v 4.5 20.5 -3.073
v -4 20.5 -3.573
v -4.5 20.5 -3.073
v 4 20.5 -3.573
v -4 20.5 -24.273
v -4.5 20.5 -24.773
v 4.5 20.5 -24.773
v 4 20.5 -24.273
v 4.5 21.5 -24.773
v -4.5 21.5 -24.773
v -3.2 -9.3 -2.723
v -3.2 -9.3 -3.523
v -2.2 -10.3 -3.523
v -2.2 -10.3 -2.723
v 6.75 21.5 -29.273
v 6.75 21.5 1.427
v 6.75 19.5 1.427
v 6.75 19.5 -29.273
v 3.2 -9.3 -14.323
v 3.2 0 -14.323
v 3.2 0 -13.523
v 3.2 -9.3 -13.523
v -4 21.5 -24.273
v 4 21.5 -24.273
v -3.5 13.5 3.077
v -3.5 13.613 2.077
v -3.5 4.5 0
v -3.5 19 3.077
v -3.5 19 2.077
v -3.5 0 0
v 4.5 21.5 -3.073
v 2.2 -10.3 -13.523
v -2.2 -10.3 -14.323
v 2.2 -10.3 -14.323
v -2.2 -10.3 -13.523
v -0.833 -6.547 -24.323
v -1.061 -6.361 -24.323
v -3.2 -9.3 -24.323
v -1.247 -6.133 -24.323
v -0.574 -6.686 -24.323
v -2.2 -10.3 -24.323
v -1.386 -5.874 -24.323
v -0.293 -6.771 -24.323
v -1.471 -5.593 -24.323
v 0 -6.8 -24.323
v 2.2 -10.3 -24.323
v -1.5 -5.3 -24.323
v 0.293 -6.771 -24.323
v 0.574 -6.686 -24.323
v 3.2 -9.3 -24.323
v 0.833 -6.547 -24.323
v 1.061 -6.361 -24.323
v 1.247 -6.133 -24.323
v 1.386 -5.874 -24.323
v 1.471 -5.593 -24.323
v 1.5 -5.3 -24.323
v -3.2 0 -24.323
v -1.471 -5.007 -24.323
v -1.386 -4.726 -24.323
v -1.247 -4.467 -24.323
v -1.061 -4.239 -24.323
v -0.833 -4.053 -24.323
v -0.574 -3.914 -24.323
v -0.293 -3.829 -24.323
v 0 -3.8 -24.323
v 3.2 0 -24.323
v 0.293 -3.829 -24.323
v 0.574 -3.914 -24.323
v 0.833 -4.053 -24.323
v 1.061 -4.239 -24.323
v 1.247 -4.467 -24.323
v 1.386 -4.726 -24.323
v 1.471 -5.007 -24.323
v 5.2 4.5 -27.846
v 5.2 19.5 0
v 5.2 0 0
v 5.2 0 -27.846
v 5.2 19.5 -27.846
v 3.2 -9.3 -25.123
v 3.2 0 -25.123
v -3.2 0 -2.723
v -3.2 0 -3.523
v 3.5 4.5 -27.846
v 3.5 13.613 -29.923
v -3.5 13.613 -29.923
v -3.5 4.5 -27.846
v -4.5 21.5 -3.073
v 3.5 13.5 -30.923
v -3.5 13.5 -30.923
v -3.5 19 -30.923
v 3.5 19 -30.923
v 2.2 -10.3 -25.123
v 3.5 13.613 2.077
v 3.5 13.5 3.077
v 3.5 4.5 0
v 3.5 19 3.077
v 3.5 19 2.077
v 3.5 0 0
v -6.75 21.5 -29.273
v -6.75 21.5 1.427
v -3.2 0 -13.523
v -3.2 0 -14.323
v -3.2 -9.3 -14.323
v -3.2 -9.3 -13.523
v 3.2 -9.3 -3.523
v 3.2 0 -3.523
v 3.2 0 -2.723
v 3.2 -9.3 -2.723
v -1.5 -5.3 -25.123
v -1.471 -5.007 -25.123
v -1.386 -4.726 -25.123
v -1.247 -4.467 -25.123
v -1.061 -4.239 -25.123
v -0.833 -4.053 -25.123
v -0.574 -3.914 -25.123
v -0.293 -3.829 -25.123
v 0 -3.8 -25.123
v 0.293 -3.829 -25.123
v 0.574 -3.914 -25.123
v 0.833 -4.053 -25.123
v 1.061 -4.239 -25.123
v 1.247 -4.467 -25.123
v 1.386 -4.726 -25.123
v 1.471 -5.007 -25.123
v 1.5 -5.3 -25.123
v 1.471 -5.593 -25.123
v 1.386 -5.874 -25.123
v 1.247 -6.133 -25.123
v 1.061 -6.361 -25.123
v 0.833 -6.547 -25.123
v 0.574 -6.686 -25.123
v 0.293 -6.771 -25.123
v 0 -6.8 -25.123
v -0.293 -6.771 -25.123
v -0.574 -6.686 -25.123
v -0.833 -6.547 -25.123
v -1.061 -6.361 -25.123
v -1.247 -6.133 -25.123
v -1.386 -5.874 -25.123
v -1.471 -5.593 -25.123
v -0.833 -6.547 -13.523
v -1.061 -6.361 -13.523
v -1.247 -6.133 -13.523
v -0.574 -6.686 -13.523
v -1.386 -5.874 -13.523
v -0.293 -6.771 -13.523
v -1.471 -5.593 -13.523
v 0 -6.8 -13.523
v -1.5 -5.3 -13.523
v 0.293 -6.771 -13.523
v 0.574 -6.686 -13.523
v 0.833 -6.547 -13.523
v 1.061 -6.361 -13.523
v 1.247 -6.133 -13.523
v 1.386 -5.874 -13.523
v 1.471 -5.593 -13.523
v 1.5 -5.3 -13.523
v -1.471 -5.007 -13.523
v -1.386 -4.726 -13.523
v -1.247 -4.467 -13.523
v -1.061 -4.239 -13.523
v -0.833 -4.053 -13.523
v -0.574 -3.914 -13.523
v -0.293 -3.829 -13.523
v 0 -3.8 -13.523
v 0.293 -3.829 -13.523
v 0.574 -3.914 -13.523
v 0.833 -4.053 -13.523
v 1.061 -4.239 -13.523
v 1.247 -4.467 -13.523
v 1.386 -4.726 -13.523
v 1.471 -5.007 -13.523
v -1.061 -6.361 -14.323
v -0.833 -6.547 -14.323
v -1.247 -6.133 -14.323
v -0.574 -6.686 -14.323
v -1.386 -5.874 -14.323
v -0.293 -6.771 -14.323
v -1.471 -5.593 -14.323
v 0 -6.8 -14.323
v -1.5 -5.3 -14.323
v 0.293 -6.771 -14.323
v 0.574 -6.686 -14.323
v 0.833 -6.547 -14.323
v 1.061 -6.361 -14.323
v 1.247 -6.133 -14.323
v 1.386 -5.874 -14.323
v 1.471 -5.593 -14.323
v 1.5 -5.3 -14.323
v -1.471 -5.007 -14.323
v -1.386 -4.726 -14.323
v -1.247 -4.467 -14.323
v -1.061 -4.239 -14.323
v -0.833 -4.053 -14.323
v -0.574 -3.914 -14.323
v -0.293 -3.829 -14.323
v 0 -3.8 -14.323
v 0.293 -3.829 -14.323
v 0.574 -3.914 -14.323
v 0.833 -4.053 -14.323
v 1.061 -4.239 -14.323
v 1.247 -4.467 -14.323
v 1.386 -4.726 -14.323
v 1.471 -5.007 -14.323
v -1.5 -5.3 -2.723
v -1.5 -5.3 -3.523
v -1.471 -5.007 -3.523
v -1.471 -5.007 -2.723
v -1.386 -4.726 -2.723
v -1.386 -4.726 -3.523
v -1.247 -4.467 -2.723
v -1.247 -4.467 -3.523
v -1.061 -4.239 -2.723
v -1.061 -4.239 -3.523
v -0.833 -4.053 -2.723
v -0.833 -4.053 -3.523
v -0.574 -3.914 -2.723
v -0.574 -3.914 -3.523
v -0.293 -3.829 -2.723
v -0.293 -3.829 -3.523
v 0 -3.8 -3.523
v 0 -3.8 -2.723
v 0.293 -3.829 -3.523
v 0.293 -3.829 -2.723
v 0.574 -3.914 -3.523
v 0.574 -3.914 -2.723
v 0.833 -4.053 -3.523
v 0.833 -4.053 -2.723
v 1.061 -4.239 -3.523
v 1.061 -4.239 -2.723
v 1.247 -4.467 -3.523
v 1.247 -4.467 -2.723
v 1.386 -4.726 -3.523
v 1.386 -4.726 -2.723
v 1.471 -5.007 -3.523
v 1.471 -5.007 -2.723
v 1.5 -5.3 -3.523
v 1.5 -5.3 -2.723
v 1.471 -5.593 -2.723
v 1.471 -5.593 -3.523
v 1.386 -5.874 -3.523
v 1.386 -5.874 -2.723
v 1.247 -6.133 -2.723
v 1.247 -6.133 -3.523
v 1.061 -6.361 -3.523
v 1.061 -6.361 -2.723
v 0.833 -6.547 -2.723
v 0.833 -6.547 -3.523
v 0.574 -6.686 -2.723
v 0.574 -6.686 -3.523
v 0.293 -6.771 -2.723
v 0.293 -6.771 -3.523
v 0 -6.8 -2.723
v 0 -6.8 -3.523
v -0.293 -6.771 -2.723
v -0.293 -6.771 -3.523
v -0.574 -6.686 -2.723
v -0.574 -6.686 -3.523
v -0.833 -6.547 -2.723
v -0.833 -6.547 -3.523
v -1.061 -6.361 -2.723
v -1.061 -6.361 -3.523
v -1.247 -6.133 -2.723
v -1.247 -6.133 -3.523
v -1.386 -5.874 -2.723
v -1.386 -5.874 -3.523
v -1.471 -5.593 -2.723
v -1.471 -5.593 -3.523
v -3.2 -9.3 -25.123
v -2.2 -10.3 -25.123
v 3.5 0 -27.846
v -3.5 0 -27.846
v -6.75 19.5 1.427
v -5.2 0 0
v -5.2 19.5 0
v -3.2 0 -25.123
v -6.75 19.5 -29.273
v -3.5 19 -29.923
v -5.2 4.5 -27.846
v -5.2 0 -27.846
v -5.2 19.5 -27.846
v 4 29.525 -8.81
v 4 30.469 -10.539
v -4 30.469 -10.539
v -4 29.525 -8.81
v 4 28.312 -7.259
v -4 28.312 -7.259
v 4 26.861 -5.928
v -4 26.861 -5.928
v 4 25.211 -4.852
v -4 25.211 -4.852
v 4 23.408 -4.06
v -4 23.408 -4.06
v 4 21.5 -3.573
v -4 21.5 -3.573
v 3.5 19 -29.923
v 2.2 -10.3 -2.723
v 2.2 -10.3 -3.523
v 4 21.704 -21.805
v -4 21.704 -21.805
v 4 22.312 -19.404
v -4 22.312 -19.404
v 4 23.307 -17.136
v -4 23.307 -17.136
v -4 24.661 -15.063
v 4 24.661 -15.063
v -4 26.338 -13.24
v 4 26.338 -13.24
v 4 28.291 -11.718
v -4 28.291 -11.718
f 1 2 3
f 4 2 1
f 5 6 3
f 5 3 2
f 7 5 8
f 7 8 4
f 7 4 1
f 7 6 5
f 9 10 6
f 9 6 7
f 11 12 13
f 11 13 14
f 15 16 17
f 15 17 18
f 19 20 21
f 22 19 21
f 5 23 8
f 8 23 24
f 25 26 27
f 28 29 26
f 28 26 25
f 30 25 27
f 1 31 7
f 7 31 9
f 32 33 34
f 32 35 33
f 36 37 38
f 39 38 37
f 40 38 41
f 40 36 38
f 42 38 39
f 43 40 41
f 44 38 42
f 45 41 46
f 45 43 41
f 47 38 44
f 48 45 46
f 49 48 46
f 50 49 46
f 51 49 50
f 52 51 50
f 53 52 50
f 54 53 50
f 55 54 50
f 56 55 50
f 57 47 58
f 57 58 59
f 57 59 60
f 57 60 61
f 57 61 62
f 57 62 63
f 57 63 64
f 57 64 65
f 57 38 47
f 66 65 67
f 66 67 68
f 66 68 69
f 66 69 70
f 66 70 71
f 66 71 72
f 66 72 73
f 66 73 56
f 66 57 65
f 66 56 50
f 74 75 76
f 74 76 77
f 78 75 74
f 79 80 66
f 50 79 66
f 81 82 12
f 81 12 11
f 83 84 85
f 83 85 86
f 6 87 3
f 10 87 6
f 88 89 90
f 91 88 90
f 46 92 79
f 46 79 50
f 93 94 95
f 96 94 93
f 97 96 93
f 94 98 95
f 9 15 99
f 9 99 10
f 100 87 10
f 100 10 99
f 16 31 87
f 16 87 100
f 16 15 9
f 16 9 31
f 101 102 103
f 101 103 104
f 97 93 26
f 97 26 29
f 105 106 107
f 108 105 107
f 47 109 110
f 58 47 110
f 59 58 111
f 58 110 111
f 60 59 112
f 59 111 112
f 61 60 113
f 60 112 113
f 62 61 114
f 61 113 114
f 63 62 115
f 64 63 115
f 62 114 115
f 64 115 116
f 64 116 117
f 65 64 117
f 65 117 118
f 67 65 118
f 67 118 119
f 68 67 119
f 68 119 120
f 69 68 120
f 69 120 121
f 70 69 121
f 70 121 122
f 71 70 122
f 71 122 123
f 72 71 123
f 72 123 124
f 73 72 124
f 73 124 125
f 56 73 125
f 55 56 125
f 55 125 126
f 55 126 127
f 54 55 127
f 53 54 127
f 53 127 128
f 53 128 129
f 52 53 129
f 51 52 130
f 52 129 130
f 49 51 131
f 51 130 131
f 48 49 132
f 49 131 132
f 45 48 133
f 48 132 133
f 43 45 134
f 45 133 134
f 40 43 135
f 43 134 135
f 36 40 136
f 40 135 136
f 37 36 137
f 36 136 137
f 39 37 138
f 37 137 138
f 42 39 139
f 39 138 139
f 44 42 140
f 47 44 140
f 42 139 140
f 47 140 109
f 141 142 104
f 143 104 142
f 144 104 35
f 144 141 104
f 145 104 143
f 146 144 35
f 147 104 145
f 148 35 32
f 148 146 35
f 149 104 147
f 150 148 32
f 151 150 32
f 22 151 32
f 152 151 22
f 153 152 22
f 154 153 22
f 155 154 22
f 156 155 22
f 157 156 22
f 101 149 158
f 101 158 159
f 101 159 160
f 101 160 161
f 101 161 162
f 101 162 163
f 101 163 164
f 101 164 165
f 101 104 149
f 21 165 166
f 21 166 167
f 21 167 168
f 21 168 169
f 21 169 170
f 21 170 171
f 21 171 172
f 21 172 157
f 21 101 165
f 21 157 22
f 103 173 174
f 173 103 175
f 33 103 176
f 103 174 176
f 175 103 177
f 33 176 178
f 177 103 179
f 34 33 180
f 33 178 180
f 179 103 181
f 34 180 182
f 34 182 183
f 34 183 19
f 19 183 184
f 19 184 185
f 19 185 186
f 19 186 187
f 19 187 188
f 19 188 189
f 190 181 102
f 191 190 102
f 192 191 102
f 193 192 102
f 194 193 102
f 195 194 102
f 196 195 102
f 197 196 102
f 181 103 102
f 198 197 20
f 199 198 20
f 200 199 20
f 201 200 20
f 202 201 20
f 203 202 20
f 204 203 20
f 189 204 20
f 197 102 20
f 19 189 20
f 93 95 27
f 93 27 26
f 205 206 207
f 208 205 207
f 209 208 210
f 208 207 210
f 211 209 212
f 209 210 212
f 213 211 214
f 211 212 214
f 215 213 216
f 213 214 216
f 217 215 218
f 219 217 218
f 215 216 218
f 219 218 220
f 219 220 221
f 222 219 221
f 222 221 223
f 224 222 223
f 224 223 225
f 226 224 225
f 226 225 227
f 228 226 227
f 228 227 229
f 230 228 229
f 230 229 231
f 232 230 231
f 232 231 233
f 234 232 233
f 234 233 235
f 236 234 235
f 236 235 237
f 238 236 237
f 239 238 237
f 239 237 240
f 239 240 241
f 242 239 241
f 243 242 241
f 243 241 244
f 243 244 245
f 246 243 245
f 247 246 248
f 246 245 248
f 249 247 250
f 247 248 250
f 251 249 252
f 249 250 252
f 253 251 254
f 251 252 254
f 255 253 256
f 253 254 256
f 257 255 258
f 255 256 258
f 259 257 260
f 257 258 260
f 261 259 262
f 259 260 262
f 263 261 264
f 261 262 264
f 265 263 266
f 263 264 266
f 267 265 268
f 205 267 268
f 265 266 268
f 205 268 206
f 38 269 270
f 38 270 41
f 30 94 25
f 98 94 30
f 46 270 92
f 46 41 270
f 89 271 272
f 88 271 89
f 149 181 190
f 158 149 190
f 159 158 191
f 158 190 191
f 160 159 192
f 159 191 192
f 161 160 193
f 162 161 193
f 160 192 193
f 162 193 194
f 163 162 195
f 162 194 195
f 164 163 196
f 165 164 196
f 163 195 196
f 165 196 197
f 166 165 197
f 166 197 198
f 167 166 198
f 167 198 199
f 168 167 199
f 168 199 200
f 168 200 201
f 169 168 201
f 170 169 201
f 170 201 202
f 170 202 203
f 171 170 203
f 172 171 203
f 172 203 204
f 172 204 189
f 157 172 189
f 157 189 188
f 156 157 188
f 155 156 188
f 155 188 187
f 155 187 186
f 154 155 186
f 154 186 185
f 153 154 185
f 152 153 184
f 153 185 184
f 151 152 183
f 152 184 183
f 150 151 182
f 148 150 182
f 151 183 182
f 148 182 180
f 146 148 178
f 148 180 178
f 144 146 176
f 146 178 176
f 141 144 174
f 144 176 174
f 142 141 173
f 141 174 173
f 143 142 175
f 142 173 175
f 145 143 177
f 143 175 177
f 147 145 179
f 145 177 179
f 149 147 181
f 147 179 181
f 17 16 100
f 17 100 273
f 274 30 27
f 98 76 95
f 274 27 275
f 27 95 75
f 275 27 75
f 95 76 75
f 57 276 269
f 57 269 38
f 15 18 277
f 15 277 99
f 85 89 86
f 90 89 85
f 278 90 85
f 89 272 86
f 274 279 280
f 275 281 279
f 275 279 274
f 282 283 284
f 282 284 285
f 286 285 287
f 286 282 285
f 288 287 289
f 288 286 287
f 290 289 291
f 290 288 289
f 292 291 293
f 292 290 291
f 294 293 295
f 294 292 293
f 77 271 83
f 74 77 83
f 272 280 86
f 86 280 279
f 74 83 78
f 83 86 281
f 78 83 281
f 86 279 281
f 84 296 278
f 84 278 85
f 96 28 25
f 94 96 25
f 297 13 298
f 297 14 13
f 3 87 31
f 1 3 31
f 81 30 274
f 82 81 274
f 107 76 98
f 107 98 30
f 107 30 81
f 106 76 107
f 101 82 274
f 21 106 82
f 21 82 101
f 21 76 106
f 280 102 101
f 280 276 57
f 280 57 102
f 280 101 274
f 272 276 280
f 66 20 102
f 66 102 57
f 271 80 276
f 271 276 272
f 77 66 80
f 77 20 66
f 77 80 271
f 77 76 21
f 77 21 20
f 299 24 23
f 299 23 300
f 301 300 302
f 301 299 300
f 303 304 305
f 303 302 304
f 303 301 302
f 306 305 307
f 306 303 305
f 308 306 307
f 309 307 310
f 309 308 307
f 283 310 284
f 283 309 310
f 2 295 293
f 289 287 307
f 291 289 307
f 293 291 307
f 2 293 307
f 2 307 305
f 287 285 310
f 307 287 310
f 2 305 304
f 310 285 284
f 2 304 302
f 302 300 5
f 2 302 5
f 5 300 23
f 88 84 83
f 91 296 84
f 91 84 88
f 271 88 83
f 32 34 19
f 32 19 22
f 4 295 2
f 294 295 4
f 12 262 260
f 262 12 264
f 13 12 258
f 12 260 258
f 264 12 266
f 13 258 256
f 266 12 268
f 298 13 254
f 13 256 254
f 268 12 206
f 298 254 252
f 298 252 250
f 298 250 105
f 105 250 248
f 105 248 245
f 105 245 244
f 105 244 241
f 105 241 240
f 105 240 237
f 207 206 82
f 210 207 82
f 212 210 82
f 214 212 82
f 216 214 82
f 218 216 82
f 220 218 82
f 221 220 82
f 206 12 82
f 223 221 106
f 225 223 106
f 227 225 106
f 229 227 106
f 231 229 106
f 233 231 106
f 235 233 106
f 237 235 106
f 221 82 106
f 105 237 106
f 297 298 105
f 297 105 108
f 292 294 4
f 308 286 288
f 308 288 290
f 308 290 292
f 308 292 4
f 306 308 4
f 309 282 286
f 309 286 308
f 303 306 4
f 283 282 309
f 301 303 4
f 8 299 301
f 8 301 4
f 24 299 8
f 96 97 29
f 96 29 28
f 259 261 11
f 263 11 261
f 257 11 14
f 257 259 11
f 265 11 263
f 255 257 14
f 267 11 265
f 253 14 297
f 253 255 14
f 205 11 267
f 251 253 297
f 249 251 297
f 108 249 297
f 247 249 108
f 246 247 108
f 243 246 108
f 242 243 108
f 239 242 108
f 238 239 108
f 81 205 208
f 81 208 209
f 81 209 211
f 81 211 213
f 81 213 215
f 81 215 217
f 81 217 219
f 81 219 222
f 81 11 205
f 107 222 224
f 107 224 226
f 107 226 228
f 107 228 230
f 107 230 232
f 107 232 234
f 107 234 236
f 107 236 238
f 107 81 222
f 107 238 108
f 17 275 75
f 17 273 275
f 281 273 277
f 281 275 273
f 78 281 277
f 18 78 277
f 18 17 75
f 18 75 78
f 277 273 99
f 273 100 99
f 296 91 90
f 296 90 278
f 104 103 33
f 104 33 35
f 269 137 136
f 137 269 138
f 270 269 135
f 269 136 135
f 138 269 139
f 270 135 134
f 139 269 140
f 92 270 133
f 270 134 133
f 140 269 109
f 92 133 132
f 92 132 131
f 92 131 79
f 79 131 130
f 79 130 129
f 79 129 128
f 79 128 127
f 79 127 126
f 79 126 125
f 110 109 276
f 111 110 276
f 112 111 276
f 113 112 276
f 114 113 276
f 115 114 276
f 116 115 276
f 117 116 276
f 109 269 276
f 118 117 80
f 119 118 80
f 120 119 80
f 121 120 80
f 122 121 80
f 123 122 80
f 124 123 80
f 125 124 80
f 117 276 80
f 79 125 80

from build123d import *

# Parameters (mm, degrees)
RESSALTO_EXTRUS_O2_DEPTH = 6.75
ESBO_O3_W                = 20.7
ESBO_O3_H                = 8.969000478
CORTE_EXTRUS_O1_DEPTH    = 2.75
ESBO_O4_W                = 20.7
ESBO_O4_H                = 8.969000478
CORTE_EXTRUS_O2_DEPTH    = 2.75
ESBO_O5_W                = 34
ESBO_O5_H                = 19.5
CORTE_EXTRUS_O3_DEPTH    = 1.55
ESBO_O6_W                = 34
ESBO_O6_H                = 19.5
CORTE_EXTRUS_O4_DEPTH    = 1.55
ESBO_O8_W                = 3.076935564
ESBO_O8_H                = 19
ESBO_O8_W_2              = 3.076935565
CORTE_EXTRUS_O5_DEPTH    = 1.7
ESBO_O9_W                = 3.076935565
ESBO_O9_H                = 19
ESBO_O9_W_2              = 3.076935564
CORTE_EXTRUS_O6_DEPTH    = 1.7
ESBO_O10_W               = 9
ESBO_O10_H               = 21.7
ESBO_O10_W_2             = 8
ESBO_O10_H_2             = 20.7
CORTE_EXTRUS_O7_DEPTH    = 1
ESBO_O11_W               = 6.4
ESBO_O11_H               = 0.8
RESSALTO_EXTRUS_O3_DEPTH = 10.3
ESBO_O12_R               = 1.5
CORTE_EXTRUS_O8_DEPTH    = 43.061413316
CHANFRO1_SIZE            = 1


with BuildPart() as part:
    # Esboço1 → Ressalto-extrusão2 (new, symmetric)
    with BuildSketch(Plane(origin=(0, 0, 0), x_dir=(0, 0, -1), z_dir=(1, 0, 0))):
        with BuildLine():
            Line((0, 0), (27.846128871, 0))
            Line((27.846128871, 0), (30.923064436, 13.5))
            Line((30.923064436, 13.5), (30.923064436, 19))
            Line((30.923064436, 19), (29.923064436, 19))
            Line((29.923064436, 19), (29.923064436, 13.612517806))
            Line((29.923064436, 13.612517806), (27.846128871, 4.5))
            Line((27.846128871, 4.5), (27.846128871, 19.5))
            Line((27.846128871, 19.5), (29.273064436, 19.5))
            Line((29.273064436, 19.5), (29.273064436, 21.5))
            Line((29.273064436, 21.5), (24.273064436, 21.5))
            ThreePointArc((24.273064436, 21.5), (16.071387559, 23.940840139), (10.5389083, 30.469000478))
            ThreePointArc((10.5389083, 30.469000478), (5.927855619, 26.860671745), (3.573064436, 21.5))
            Line((3.573064436, 21.5), (-1.426935564, 21.5))
            Line((-1.426935564, 21.5), (-1.426935564, 19.5))
            Line((-1.426935564, 19.5), (0, 19.5))
            Line((0, 19.5), (0, 4.5))
            Line((0, 4.5), (-2.076935564, 13.612517806))
            Line((-2.076935564, 13.612517806), (-2.076935564, 19))
            Line((-2.076935564, 19), (-3.076935564, 19))
            Line((-3.076935564, 19), (-3.076935564, 13.5))
            Line((-3.076935564, 13.5), (0, 0))
        make_face()
    extrude(amount=RESSALTO_EXTRUS_O2_DEPTH, both=True)

    # Esboço3 → Corte-extrusão1 (cut)
    with BuildSketch(Plane(origin=(6.75, 0, 0), x_dir=(0, 0, -1), z_dir=(1, 0, 0))):
        with Locations((13.923064436, 25.984500239)):
            Rectangle(ESBO_O3_W, ESBO_O3_H)
    extrude(amount=-CORTE_EXTRUS_O1_DEPTH, mode=Mode.SUBTRACT)

    # Esboço4 → Corte-extrusão2 (cut)
    with BuildSketch(Plane.ZY.offset(6.75)):
        with Locations((-13.923064436, 25.984500239)):
            Rectangle(ESBO_O4_W, ESBO_O4_H)
    extrude(amount=-CORTE_EXTRUS_O2_DEPTH, mode=Mode.SUBTRACT)

    # Esboço5 → Corte-extrusão3 (cut)
    with BuildSketch(Plane.ZY.offset(6.75)):
        with Locations((-13.923064436, 9.75)):
            Rectangle(ESBO_O5_W, ESBO_O5_H)
    extrude(amount=-CORTE_EXTRUS_O3_DEPTH, mode=Mode.SUBTRACT)

    # Esboço6 → Corte-extrusão4 (cut)
    with BuildSketch(Plane(origin=(6.75, 0, 0), x_dir=(0, 0, -1), z_dir=(1, 0, 0))):
        with Locations((13.923064436, 9.75)):
            Rectangle(ESBO_O6_W, ESBO_O6_H)
    extrude(amount=-CORTE_EXTRUS_O4_DEPTH, mode=Mode.SUBTRACT)

    # Esboço8 → Corte-extrusão5 (cut)
    with BuildSketch(Plane(origin=(5.2, 0, 0), x_dir=(0, 0, -1), z_dir=(1, 0, 0))):
        with Locations((-1.538467782, 9.5)):
            Rectangle(ESBO_O8_W, ESBO_O8_H)
        with Locations((29.384596654, 9.5)):
            Rectangle(ESBO_O8_W_2, ESBO_O8_H)
    extrude(amount=-CORTE_EXTRUS_O5_DEPTH, mode=Mode.SUBTRACT)

    # Esboço9 → Corte-extrusão6 (cut)
    with BuildSketch(Plane.ZY.offset(5.2)):
        with Locations((-29.384596654, 9.5)):
            Rectangle(ESBO_O9_W, ESBO_O9_H)
        with Locations((1.538467782, 9.5)):
            Rectangle(ESBO_O9_W_2, ESBO_O9_H)
    extrude(amount=-CORTE_EXTRUS_O6_DEPTH, mode=Mode.SUBTRACT)

    # Esboço10 → Corte-extrusão7 (cut)
    with BuildSketch(Plane(origin=(0, 21.5, 0), x_dir=(1, 0, 0), z_dir=(0, 1, 0))):
        with Locations((0, 13.923064436)):
            Rectangle(ESBO_O10_W, ESBO_O10_H)
        with Locations((0, 13.923064436)):
            Rectangle(ESBO_O10_W_2, ESBO_O10_H_2, mode=Mode.SUBTRACT)
    extrude(amount=-CORTE_EXTRUS_O7_DEPTH, mode=Mode.SUBTRACT)

    # Esboço11 → Ressalto-extrusão3 (add)
    with BuildSketch(Plane.XZ):
        with Locations((0, -3.123064436)):
            Rectangle(ESBO_O11_W, ESBO_O11_H)
        with Locations((0, -13.923064436)):
            Rectangle(ESBO_O11_W, ESBO_O11_H)
        with Locations((0, -24.723064436)):
            Rectangle(ESBO_O11_W, ESBO_O11_H)
    extrude(amount=RESSALTO_EXTRUS_O3_DEPTH)

    # Esboço12 → Corte-extrusão8 (cut, through all)
    with BuildSketch(Plane(origin=(0, 0, -25.123064436), x_dir=(-1, 0, 0), z_dir=(0, 0, -1))):
        with Locations((0, -5.3)):
            Circle(ESBO_O12_R)
    extrude(amount=-CORTE_EXTRUS_O8_DEPTH, mode=Mode.SUBTRACT)

    # Chanfro1
    chanfro1_edges = [part.edges().sort_by_distance(p)[0] for p in [
        (-3.2, -10.3, -3.123064436),
        (3.2, -10.3, -3.123064436),
        (-3.2, -10.3, -13.923064436),
        (3.2, -10.3, -13.923064436),
        (-3.2, -10.3, -24.723064436),
        (3.2, -10.3, -24.723064436),
    ]]
    chamfer(chanfro1_edges, length=CHANFRO1_SIZE)


solid = part.part
